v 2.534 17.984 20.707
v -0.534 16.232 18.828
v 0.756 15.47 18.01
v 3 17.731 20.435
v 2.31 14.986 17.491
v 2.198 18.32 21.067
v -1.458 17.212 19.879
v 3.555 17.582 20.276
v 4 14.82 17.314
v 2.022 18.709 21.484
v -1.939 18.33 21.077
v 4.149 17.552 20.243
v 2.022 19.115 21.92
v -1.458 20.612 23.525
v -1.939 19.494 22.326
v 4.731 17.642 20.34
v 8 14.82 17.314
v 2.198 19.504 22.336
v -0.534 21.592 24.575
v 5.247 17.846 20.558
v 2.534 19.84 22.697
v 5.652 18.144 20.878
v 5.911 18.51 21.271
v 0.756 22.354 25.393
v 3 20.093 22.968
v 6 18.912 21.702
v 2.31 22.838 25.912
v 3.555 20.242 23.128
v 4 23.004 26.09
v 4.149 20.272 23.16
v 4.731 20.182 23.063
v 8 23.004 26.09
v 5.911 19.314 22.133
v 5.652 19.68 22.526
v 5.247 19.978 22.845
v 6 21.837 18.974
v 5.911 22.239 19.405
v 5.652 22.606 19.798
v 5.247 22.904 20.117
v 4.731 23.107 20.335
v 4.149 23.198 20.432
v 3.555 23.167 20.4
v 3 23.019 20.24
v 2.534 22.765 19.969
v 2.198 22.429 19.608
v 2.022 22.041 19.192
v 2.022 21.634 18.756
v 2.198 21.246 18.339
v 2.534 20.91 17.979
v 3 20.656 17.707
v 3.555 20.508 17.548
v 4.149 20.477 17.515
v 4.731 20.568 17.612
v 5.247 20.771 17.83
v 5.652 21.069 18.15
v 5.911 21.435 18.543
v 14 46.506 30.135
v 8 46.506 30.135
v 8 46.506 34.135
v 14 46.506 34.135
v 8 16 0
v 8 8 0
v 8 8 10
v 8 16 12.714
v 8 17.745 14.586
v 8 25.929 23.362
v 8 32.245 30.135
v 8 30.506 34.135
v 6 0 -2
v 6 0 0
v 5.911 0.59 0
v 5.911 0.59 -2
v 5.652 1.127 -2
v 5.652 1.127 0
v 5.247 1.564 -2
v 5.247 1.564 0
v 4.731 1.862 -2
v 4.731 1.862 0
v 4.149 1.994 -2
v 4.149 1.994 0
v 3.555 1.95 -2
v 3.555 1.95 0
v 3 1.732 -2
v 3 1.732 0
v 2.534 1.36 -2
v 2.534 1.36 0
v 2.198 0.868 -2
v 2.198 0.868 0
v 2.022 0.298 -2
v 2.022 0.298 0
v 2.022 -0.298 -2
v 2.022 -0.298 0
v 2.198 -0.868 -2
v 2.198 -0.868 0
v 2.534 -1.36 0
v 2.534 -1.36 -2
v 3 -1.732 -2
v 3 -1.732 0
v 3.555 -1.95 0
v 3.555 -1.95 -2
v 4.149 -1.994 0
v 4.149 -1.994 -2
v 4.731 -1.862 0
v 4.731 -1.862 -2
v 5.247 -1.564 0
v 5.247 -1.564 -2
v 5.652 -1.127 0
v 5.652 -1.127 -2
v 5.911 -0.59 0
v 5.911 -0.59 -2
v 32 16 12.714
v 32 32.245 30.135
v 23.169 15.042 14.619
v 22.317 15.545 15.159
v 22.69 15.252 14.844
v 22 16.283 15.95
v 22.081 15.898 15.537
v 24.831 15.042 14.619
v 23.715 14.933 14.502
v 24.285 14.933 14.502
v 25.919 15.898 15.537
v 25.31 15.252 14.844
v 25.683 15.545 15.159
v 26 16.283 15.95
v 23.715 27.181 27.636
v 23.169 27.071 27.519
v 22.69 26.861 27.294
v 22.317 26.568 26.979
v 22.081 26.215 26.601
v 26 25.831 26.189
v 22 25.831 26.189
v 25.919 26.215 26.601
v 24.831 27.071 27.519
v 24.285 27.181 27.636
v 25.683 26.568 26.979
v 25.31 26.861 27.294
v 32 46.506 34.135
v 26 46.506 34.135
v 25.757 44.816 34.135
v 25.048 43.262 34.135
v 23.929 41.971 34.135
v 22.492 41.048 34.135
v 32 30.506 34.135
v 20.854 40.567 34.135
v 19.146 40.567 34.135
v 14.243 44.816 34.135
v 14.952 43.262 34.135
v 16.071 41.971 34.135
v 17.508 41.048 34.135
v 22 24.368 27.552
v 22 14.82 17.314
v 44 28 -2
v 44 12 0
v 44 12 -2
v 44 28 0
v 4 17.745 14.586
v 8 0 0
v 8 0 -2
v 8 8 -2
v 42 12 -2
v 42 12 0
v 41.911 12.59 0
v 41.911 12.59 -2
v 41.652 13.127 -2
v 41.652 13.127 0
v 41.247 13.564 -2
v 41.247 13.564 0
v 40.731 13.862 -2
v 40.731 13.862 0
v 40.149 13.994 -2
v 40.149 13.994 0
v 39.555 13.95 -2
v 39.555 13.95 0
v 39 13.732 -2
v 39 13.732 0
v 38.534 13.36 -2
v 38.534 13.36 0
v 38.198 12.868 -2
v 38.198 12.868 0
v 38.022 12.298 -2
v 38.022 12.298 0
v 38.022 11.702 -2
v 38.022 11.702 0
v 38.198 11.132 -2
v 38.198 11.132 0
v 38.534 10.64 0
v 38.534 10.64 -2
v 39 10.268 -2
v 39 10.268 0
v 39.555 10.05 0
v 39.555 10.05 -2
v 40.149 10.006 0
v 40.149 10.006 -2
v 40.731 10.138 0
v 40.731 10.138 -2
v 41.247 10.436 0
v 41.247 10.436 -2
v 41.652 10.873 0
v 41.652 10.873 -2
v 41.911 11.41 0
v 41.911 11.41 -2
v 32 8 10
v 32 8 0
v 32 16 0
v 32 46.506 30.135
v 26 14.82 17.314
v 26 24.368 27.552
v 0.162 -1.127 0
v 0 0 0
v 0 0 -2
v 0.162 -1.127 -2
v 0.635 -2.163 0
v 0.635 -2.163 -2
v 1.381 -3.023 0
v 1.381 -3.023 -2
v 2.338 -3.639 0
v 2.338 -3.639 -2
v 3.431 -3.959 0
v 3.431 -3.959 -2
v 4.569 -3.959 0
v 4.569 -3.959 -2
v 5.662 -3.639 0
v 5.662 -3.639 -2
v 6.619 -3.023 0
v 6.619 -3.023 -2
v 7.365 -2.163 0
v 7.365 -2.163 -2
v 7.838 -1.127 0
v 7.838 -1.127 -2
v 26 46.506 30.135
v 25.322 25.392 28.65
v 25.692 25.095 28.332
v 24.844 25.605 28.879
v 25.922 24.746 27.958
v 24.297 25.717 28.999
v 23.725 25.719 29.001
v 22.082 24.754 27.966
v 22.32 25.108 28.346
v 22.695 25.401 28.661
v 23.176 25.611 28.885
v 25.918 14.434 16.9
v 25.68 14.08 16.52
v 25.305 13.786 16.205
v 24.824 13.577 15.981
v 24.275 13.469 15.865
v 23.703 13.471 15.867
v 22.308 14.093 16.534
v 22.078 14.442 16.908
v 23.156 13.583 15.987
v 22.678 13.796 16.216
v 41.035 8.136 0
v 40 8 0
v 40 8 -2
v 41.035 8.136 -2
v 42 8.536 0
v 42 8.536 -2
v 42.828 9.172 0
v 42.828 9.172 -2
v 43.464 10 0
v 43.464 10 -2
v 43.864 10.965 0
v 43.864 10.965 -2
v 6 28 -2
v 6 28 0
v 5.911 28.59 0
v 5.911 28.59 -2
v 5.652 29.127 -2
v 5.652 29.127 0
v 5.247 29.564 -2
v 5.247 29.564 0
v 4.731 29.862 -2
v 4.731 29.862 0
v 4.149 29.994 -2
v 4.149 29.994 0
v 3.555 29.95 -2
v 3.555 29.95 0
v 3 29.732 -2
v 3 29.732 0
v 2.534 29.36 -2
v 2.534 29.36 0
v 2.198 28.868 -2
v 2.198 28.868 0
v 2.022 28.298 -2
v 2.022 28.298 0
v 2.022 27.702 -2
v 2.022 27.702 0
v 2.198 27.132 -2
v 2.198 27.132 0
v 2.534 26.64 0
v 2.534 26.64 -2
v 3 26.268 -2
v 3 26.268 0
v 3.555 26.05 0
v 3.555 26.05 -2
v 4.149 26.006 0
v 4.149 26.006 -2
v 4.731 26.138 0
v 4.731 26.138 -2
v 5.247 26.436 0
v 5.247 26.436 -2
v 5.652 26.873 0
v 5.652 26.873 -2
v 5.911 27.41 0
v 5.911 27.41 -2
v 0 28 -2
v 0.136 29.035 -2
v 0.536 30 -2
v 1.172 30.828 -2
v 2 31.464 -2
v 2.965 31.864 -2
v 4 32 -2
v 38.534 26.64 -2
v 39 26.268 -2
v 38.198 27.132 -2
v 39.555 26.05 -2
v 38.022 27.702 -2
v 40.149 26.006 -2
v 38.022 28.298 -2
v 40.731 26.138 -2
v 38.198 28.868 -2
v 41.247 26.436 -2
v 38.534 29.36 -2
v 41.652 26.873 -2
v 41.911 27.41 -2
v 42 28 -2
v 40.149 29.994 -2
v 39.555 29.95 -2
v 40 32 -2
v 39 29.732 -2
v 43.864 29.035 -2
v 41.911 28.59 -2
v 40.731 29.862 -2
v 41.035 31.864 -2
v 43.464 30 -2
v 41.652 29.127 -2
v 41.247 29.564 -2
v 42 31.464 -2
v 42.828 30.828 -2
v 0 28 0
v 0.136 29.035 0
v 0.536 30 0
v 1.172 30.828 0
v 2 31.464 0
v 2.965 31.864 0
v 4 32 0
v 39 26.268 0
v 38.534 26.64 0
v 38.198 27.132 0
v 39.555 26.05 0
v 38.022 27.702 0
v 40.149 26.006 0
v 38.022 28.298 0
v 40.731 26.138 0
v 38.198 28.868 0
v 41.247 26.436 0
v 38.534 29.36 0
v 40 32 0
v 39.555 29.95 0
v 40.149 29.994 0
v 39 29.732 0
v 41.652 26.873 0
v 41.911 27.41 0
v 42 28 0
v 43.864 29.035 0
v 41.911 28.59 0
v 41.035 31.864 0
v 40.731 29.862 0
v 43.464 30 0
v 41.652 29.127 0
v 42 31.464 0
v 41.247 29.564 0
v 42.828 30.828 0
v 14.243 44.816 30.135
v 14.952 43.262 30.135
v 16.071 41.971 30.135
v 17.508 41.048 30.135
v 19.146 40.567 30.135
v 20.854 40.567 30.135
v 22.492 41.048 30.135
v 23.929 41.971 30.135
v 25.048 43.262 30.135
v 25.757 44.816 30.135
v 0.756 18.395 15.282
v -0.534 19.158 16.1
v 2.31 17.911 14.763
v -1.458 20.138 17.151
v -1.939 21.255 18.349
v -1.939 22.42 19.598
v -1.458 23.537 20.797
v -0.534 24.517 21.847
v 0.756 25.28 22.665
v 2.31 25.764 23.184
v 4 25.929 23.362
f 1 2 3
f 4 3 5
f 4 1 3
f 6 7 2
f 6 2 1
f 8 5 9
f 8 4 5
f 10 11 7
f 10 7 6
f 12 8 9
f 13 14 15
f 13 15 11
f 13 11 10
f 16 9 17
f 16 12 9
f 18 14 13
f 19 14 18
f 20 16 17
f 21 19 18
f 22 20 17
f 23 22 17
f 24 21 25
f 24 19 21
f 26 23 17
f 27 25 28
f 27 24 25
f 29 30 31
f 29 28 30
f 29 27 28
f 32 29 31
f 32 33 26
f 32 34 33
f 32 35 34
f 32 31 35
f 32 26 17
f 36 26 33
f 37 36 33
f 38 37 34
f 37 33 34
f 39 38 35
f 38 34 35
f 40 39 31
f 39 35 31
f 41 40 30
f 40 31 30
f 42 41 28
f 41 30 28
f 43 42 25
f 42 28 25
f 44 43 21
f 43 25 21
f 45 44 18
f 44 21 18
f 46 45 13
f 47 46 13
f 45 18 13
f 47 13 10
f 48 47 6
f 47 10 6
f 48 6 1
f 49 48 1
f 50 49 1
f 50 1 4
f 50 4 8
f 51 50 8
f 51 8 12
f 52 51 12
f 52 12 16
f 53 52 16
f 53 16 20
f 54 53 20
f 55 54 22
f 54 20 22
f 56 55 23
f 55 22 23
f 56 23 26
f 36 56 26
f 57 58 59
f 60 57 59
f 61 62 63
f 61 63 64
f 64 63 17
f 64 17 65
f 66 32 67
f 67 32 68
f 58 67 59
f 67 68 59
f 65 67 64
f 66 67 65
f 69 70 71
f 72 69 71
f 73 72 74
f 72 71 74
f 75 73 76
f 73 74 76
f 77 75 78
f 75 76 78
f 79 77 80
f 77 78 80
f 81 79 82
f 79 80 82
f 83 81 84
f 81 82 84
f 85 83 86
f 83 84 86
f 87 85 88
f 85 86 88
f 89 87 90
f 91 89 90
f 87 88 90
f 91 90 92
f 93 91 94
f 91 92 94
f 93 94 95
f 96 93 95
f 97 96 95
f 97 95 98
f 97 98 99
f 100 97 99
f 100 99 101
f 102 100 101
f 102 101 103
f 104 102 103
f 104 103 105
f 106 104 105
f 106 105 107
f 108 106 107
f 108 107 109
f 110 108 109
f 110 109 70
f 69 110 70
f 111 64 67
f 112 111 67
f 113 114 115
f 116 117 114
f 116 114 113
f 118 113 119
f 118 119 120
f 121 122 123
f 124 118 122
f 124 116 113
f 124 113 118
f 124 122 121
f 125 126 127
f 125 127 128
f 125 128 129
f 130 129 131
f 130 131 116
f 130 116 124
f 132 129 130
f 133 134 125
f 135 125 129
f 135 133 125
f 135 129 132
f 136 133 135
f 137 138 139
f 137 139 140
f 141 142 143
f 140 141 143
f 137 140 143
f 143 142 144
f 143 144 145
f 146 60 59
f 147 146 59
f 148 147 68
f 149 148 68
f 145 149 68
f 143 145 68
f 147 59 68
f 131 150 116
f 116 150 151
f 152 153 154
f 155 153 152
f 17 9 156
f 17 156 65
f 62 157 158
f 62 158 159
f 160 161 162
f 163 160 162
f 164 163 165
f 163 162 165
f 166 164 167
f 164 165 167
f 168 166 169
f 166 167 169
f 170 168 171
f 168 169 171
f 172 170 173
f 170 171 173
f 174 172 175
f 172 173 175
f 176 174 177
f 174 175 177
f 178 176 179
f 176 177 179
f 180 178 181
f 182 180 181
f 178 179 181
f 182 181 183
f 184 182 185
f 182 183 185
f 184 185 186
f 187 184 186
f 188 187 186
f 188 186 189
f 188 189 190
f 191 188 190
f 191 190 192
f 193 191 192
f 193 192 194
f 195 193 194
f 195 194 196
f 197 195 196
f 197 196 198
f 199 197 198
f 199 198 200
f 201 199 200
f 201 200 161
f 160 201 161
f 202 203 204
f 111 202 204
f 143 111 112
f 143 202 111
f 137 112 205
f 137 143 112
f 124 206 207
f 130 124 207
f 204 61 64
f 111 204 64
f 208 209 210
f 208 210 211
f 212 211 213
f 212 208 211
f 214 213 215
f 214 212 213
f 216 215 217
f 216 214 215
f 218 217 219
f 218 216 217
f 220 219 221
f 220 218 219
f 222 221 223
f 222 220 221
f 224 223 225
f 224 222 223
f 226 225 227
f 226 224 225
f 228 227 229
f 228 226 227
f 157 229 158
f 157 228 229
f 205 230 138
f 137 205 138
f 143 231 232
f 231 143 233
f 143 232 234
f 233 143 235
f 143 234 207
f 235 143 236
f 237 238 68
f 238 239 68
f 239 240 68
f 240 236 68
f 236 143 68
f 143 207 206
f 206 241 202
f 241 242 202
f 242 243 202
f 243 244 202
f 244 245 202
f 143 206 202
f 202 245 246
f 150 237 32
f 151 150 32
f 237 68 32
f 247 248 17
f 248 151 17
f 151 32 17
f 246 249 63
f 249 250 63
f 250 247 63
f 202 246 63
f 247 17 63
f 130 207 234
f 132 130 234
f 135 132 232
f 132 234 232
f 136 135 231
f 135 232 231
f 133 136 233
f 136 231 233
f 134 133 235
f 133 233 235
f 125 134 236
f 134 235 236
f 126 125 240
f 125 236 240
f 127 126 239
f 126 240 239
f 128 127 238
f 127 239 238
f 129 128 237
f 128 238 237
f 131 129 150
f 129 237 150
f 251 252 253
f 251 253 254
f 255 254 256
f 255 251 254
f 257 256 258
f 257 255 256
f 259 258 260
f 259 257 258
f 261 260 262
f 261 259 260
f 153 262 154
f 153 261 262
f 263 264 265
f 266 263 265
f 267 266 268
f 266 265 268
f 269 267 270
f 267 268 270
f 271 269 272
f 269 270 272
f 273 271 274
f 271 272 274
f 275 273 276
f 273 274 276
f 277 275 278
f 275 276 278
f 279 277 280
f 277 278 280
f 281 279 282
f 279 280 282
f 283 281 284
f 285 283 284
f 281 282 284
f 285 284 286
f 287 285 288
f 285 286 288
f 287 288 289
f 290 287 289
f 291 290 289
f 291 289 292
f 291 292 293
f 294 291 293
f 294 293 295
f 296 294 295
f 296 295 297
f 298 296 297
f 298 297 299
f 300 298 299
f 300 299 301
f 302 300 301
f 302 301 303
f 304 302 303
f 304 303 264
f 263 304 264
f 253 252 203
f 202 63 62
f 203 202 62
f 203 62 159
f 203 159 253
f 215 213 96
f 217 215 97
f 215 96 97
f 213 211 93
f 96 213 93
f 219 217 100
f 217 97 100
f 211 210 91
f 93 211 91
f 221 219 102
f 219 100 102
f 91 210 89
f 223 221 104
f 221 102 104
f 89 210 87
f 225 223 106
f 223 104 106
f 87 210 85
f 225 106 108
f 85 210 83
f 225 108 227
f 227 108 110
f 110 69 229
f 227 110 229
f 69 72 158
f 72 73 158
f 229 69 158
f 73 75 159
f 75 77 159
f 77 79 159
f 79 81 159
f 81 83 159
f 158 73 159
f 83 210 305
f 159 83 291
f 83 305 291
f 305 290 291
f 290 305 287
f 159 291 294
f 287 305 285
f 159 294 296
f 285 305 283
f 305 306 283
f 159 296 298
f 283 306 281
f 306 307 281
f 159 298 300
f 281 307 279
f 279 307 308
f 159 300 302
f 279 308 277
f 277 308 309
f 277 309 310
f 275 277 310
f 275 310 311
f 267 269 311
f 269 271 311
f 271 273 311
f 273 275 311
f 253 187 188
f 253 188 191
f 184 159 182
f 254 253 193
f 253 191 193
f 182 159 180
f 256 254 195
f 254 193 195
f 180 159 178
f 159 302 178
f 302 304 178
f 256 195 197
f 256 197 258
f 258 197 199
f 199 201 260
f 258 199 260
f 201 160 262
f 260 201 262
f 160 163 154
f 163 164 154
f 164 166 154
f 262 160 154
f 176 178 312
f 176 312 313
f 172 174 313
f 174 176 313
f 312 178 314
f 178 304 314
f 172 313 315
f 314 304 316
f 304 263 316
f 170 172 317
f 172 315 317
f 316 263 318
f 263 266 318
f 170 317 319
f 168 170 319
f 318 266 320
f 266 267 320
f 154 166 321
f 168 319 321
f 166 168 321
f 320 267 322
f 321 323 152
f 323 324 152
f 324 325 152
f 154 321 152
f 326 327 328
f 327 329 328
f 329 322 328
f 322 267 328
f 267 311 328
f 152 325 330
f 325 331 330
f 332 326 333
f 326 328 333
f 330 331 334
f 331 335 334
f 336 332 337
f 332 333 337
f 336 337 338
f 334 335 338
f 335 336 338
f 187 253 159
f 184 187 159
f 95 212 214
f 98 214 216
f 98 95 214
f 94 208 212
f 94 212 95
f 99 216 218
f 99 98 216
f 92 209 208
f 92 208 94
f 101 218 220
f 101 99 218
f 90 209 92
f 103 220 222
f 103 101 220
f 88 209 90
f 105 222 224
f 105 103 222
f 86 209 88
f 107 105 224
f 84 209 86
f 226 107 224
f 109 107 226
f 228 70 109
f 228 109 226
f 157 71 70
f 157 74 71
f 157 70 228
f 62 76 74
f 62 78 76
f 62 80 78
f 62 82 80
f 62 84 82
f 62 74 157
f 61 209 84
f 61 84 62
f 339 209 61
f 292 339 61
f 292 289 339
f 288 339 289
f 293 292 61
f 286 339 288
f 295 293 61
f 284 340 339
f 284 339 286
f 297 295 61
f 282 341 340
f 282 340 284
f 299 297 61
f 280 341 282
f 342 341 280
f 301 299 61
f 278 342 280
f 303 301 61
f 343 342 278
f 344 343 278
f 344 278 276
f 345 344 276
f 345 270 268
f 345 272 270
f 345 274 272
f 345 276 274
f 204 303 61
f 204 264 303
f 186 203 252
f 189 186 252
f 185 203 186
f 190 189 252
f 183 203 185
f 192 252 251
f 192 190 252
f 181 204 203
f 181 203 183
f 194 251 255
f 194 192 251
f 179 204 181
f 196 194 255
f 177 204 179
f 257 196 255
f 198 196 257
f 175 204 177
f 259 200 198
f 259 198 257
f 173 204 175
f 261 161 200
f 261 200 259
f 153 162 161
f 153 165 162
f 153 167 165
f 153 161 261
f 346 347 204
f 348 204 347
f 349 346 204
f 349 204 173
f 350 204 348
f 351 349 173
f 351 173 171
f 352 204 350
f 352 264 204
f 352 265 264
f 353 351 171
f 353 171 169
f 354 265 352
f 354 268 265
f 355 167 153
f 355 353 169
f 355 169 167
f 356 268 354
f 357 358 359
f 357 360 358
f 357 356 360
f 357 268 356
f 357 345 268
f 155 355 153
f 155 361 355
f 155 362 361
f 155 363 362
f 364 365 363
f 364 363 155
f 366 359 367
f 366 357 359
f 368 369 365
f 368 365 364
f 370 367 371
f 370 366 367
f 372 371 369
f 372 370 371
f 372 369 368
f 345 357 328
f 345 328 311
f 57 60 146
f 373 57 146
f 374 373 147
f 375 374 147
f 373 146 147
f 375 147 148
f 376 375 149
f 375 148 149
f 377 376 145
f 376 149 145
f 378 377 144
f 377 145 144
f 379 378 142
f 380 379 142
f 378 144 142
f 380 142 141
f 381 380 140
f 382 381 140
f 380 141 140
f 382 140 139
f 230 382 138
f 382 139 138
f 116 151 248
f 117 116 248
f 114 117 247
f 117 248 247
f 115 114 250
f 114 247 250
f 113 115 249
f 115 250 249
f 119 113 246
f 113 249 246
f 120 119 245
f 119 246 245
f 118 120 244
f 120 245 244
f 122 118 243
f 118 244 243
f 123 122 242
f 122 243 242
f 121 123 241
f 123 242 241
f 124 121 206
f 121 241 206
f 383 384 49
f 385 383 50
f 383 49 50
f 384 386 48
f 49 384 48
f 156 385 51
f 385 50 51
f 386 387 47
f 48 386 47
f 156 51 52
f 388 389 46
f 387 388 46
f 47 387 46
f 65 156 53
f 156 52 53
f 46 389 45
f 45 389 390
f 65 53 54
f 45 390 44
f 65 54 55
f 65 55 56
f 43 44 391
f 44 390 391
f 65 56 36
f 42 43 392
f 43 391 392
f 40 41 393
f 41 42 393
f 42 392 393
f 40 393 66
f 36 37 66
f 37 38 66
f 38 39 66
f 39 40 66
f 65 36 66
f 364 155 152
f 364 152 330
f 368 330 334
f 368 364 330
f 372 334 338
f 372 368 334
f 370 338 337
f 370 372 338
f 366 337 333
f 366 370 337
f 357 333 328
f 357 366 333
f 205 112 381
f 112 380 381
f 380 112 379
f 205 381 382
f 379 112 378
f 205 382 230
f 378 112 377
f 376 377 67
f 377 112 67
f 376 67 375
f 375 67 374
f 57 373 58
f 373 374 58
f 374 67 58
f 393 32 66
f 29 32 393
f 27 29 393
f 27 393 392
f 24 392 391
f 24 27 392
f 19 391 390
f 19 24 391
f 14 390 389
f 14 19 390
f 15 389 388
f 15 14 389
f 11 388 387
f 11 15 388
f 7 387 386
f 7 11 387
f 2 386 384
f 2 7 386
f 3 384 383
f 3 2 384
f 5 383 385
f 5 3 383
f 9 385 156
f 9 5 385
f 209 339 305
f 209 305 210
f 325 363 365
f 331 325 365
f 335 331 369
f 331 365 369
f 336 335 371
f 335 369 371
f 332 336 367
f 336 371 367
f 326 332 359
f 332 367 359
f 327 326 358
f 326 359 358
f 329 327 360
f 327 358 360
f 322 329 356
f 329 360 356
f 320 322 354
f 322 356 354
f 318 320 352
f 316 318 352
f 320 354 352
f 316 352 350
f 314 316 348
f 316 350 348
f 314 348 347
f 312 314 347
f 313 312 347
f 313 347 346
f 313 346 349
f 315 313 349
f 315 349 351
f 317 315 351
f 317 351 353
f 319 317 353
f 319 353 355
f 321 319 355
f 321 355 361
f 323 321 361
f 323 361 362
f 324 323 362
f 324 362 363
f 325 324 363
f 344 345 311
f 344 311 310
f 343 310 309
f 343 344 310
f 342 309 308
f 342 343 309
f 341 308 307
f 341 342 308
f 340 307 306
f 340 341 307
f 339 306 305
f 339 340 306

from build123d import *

# Parameters (mm, degrees)
F1_DEPTH  = 2
F3_DEPTH  = 24
F4_R      = 2
F5_DEPTH  = 2.001
F6_R      = 2
F7_DEPTH  = 4
F8_DEPTH  = 2
F10_DEPTH = 36.135672


with BuildPart() as f1:
    # F0 (on Top) → F1 (new body)
    with BuildSketch(Plane.XY):
        with BuildLine():
            Line((0, 28), (0, 0))
            ThreePointArc((0, 0), (4, -4), (8, 0))
            Line((8, 0), (8, 8))
            Line((8, 8), (40, 8))
            ThreePointArc((40, 8), (42.828427, 9.171573), (44, 12))
            Line((44, 12), (44, 28))
            ThreePointArc((44, 28), (42.828427, 30.828427), (40, 32))
            Line((40, 32), (4, 32))
            ThreePointArc((4, 32), (1.171573, 30.828427), (0, 28))
        make_face()
    extrude(amount=-F1_DEPTH)

    # F2 (on face) → F3 (join)
    with BuildSketch(Plane.YZ.offset(8)):
        Polygon((8, 10), (8, 0), (16, 0), (16, 12.713833), (32.245195, 30.134672), (46.505946, 30.134672), (46.505946, 34.134672), (30.505946, 34.134672), align=None)
    extrude(amount=F3_DEPTH)

    # F4 (on face) → F5 (cut, through all)
    with BuildSketch(Plane.XY):
        with Locations((40, 12)):
            Circle(F4_R)
        with Locations((40, 28)):
            Circle(F4_R)
        with Locations((4, 0)):
            Circle(F4_R)
        with Locations((4, 28)):
            Circle(F4_R)
    extrude(amount=-F5_DEPTH, mode=Mode.SUBTRACT)

    # F6 (on face) → F7 (join)
    with BuildSketch(Plane(origin=(0, -0.708794, 0.660961), x_dir=(1, 0, 0), z_dir=(0, -0.731354, 0.681998))):
        with BuildLine():
            Line((4, 22.769524), (8, 22.769524))
            Line((8, 22.769524), (8, 34.769524))
            Line((8, 34.769524), (4, 34.769524))
            ThreePointArc((4, 34.769524), (-2, 28.769524), (4, 22.769524))
        make_face()
        with Locations((4, 28.769524)):
            Circle(F6_R, mode=Mode.SUBTRACT)
    extrude(amount=-F7_DEPTH)

    # F6 (on face) → F8 (cut)
    with BuildSketch(Plane(origin=(0, -0.708794, 0.660961), x_dir=(1, 0, 0), z_dir=(0, -0.731354, 0.681998))):
        with BuildLine():
            Line((26, 22.769524), (26, 36.769524))
            ThreePointArc((26, 36.769524), (24, 38.769524), (22, 36.769524))
            Line((22, 36.769524), (22, 22.769524))
            ThreePointArc((22, 22.769524), (24, 20.769524), (26, 22.769524))
        make_face()
    extrude(amount=-F8_DEPTH, mode=Mode.SUBTRACT)

    # F9 (on face) → F10 (cut, through all)
    with BuildSketch(Plane.XY.offset(34.134672)):
        with BuildLine():
            ThreePointArc((14, 46.505946), (20, 40.505946), (26, 46.505946))
            Line((26, 46.505946), (14, 46.505946))
        make_face()
    extrude(amount=-F10_DEPTH, mode=Mode.SUBTRACT)


solid = f1.part
